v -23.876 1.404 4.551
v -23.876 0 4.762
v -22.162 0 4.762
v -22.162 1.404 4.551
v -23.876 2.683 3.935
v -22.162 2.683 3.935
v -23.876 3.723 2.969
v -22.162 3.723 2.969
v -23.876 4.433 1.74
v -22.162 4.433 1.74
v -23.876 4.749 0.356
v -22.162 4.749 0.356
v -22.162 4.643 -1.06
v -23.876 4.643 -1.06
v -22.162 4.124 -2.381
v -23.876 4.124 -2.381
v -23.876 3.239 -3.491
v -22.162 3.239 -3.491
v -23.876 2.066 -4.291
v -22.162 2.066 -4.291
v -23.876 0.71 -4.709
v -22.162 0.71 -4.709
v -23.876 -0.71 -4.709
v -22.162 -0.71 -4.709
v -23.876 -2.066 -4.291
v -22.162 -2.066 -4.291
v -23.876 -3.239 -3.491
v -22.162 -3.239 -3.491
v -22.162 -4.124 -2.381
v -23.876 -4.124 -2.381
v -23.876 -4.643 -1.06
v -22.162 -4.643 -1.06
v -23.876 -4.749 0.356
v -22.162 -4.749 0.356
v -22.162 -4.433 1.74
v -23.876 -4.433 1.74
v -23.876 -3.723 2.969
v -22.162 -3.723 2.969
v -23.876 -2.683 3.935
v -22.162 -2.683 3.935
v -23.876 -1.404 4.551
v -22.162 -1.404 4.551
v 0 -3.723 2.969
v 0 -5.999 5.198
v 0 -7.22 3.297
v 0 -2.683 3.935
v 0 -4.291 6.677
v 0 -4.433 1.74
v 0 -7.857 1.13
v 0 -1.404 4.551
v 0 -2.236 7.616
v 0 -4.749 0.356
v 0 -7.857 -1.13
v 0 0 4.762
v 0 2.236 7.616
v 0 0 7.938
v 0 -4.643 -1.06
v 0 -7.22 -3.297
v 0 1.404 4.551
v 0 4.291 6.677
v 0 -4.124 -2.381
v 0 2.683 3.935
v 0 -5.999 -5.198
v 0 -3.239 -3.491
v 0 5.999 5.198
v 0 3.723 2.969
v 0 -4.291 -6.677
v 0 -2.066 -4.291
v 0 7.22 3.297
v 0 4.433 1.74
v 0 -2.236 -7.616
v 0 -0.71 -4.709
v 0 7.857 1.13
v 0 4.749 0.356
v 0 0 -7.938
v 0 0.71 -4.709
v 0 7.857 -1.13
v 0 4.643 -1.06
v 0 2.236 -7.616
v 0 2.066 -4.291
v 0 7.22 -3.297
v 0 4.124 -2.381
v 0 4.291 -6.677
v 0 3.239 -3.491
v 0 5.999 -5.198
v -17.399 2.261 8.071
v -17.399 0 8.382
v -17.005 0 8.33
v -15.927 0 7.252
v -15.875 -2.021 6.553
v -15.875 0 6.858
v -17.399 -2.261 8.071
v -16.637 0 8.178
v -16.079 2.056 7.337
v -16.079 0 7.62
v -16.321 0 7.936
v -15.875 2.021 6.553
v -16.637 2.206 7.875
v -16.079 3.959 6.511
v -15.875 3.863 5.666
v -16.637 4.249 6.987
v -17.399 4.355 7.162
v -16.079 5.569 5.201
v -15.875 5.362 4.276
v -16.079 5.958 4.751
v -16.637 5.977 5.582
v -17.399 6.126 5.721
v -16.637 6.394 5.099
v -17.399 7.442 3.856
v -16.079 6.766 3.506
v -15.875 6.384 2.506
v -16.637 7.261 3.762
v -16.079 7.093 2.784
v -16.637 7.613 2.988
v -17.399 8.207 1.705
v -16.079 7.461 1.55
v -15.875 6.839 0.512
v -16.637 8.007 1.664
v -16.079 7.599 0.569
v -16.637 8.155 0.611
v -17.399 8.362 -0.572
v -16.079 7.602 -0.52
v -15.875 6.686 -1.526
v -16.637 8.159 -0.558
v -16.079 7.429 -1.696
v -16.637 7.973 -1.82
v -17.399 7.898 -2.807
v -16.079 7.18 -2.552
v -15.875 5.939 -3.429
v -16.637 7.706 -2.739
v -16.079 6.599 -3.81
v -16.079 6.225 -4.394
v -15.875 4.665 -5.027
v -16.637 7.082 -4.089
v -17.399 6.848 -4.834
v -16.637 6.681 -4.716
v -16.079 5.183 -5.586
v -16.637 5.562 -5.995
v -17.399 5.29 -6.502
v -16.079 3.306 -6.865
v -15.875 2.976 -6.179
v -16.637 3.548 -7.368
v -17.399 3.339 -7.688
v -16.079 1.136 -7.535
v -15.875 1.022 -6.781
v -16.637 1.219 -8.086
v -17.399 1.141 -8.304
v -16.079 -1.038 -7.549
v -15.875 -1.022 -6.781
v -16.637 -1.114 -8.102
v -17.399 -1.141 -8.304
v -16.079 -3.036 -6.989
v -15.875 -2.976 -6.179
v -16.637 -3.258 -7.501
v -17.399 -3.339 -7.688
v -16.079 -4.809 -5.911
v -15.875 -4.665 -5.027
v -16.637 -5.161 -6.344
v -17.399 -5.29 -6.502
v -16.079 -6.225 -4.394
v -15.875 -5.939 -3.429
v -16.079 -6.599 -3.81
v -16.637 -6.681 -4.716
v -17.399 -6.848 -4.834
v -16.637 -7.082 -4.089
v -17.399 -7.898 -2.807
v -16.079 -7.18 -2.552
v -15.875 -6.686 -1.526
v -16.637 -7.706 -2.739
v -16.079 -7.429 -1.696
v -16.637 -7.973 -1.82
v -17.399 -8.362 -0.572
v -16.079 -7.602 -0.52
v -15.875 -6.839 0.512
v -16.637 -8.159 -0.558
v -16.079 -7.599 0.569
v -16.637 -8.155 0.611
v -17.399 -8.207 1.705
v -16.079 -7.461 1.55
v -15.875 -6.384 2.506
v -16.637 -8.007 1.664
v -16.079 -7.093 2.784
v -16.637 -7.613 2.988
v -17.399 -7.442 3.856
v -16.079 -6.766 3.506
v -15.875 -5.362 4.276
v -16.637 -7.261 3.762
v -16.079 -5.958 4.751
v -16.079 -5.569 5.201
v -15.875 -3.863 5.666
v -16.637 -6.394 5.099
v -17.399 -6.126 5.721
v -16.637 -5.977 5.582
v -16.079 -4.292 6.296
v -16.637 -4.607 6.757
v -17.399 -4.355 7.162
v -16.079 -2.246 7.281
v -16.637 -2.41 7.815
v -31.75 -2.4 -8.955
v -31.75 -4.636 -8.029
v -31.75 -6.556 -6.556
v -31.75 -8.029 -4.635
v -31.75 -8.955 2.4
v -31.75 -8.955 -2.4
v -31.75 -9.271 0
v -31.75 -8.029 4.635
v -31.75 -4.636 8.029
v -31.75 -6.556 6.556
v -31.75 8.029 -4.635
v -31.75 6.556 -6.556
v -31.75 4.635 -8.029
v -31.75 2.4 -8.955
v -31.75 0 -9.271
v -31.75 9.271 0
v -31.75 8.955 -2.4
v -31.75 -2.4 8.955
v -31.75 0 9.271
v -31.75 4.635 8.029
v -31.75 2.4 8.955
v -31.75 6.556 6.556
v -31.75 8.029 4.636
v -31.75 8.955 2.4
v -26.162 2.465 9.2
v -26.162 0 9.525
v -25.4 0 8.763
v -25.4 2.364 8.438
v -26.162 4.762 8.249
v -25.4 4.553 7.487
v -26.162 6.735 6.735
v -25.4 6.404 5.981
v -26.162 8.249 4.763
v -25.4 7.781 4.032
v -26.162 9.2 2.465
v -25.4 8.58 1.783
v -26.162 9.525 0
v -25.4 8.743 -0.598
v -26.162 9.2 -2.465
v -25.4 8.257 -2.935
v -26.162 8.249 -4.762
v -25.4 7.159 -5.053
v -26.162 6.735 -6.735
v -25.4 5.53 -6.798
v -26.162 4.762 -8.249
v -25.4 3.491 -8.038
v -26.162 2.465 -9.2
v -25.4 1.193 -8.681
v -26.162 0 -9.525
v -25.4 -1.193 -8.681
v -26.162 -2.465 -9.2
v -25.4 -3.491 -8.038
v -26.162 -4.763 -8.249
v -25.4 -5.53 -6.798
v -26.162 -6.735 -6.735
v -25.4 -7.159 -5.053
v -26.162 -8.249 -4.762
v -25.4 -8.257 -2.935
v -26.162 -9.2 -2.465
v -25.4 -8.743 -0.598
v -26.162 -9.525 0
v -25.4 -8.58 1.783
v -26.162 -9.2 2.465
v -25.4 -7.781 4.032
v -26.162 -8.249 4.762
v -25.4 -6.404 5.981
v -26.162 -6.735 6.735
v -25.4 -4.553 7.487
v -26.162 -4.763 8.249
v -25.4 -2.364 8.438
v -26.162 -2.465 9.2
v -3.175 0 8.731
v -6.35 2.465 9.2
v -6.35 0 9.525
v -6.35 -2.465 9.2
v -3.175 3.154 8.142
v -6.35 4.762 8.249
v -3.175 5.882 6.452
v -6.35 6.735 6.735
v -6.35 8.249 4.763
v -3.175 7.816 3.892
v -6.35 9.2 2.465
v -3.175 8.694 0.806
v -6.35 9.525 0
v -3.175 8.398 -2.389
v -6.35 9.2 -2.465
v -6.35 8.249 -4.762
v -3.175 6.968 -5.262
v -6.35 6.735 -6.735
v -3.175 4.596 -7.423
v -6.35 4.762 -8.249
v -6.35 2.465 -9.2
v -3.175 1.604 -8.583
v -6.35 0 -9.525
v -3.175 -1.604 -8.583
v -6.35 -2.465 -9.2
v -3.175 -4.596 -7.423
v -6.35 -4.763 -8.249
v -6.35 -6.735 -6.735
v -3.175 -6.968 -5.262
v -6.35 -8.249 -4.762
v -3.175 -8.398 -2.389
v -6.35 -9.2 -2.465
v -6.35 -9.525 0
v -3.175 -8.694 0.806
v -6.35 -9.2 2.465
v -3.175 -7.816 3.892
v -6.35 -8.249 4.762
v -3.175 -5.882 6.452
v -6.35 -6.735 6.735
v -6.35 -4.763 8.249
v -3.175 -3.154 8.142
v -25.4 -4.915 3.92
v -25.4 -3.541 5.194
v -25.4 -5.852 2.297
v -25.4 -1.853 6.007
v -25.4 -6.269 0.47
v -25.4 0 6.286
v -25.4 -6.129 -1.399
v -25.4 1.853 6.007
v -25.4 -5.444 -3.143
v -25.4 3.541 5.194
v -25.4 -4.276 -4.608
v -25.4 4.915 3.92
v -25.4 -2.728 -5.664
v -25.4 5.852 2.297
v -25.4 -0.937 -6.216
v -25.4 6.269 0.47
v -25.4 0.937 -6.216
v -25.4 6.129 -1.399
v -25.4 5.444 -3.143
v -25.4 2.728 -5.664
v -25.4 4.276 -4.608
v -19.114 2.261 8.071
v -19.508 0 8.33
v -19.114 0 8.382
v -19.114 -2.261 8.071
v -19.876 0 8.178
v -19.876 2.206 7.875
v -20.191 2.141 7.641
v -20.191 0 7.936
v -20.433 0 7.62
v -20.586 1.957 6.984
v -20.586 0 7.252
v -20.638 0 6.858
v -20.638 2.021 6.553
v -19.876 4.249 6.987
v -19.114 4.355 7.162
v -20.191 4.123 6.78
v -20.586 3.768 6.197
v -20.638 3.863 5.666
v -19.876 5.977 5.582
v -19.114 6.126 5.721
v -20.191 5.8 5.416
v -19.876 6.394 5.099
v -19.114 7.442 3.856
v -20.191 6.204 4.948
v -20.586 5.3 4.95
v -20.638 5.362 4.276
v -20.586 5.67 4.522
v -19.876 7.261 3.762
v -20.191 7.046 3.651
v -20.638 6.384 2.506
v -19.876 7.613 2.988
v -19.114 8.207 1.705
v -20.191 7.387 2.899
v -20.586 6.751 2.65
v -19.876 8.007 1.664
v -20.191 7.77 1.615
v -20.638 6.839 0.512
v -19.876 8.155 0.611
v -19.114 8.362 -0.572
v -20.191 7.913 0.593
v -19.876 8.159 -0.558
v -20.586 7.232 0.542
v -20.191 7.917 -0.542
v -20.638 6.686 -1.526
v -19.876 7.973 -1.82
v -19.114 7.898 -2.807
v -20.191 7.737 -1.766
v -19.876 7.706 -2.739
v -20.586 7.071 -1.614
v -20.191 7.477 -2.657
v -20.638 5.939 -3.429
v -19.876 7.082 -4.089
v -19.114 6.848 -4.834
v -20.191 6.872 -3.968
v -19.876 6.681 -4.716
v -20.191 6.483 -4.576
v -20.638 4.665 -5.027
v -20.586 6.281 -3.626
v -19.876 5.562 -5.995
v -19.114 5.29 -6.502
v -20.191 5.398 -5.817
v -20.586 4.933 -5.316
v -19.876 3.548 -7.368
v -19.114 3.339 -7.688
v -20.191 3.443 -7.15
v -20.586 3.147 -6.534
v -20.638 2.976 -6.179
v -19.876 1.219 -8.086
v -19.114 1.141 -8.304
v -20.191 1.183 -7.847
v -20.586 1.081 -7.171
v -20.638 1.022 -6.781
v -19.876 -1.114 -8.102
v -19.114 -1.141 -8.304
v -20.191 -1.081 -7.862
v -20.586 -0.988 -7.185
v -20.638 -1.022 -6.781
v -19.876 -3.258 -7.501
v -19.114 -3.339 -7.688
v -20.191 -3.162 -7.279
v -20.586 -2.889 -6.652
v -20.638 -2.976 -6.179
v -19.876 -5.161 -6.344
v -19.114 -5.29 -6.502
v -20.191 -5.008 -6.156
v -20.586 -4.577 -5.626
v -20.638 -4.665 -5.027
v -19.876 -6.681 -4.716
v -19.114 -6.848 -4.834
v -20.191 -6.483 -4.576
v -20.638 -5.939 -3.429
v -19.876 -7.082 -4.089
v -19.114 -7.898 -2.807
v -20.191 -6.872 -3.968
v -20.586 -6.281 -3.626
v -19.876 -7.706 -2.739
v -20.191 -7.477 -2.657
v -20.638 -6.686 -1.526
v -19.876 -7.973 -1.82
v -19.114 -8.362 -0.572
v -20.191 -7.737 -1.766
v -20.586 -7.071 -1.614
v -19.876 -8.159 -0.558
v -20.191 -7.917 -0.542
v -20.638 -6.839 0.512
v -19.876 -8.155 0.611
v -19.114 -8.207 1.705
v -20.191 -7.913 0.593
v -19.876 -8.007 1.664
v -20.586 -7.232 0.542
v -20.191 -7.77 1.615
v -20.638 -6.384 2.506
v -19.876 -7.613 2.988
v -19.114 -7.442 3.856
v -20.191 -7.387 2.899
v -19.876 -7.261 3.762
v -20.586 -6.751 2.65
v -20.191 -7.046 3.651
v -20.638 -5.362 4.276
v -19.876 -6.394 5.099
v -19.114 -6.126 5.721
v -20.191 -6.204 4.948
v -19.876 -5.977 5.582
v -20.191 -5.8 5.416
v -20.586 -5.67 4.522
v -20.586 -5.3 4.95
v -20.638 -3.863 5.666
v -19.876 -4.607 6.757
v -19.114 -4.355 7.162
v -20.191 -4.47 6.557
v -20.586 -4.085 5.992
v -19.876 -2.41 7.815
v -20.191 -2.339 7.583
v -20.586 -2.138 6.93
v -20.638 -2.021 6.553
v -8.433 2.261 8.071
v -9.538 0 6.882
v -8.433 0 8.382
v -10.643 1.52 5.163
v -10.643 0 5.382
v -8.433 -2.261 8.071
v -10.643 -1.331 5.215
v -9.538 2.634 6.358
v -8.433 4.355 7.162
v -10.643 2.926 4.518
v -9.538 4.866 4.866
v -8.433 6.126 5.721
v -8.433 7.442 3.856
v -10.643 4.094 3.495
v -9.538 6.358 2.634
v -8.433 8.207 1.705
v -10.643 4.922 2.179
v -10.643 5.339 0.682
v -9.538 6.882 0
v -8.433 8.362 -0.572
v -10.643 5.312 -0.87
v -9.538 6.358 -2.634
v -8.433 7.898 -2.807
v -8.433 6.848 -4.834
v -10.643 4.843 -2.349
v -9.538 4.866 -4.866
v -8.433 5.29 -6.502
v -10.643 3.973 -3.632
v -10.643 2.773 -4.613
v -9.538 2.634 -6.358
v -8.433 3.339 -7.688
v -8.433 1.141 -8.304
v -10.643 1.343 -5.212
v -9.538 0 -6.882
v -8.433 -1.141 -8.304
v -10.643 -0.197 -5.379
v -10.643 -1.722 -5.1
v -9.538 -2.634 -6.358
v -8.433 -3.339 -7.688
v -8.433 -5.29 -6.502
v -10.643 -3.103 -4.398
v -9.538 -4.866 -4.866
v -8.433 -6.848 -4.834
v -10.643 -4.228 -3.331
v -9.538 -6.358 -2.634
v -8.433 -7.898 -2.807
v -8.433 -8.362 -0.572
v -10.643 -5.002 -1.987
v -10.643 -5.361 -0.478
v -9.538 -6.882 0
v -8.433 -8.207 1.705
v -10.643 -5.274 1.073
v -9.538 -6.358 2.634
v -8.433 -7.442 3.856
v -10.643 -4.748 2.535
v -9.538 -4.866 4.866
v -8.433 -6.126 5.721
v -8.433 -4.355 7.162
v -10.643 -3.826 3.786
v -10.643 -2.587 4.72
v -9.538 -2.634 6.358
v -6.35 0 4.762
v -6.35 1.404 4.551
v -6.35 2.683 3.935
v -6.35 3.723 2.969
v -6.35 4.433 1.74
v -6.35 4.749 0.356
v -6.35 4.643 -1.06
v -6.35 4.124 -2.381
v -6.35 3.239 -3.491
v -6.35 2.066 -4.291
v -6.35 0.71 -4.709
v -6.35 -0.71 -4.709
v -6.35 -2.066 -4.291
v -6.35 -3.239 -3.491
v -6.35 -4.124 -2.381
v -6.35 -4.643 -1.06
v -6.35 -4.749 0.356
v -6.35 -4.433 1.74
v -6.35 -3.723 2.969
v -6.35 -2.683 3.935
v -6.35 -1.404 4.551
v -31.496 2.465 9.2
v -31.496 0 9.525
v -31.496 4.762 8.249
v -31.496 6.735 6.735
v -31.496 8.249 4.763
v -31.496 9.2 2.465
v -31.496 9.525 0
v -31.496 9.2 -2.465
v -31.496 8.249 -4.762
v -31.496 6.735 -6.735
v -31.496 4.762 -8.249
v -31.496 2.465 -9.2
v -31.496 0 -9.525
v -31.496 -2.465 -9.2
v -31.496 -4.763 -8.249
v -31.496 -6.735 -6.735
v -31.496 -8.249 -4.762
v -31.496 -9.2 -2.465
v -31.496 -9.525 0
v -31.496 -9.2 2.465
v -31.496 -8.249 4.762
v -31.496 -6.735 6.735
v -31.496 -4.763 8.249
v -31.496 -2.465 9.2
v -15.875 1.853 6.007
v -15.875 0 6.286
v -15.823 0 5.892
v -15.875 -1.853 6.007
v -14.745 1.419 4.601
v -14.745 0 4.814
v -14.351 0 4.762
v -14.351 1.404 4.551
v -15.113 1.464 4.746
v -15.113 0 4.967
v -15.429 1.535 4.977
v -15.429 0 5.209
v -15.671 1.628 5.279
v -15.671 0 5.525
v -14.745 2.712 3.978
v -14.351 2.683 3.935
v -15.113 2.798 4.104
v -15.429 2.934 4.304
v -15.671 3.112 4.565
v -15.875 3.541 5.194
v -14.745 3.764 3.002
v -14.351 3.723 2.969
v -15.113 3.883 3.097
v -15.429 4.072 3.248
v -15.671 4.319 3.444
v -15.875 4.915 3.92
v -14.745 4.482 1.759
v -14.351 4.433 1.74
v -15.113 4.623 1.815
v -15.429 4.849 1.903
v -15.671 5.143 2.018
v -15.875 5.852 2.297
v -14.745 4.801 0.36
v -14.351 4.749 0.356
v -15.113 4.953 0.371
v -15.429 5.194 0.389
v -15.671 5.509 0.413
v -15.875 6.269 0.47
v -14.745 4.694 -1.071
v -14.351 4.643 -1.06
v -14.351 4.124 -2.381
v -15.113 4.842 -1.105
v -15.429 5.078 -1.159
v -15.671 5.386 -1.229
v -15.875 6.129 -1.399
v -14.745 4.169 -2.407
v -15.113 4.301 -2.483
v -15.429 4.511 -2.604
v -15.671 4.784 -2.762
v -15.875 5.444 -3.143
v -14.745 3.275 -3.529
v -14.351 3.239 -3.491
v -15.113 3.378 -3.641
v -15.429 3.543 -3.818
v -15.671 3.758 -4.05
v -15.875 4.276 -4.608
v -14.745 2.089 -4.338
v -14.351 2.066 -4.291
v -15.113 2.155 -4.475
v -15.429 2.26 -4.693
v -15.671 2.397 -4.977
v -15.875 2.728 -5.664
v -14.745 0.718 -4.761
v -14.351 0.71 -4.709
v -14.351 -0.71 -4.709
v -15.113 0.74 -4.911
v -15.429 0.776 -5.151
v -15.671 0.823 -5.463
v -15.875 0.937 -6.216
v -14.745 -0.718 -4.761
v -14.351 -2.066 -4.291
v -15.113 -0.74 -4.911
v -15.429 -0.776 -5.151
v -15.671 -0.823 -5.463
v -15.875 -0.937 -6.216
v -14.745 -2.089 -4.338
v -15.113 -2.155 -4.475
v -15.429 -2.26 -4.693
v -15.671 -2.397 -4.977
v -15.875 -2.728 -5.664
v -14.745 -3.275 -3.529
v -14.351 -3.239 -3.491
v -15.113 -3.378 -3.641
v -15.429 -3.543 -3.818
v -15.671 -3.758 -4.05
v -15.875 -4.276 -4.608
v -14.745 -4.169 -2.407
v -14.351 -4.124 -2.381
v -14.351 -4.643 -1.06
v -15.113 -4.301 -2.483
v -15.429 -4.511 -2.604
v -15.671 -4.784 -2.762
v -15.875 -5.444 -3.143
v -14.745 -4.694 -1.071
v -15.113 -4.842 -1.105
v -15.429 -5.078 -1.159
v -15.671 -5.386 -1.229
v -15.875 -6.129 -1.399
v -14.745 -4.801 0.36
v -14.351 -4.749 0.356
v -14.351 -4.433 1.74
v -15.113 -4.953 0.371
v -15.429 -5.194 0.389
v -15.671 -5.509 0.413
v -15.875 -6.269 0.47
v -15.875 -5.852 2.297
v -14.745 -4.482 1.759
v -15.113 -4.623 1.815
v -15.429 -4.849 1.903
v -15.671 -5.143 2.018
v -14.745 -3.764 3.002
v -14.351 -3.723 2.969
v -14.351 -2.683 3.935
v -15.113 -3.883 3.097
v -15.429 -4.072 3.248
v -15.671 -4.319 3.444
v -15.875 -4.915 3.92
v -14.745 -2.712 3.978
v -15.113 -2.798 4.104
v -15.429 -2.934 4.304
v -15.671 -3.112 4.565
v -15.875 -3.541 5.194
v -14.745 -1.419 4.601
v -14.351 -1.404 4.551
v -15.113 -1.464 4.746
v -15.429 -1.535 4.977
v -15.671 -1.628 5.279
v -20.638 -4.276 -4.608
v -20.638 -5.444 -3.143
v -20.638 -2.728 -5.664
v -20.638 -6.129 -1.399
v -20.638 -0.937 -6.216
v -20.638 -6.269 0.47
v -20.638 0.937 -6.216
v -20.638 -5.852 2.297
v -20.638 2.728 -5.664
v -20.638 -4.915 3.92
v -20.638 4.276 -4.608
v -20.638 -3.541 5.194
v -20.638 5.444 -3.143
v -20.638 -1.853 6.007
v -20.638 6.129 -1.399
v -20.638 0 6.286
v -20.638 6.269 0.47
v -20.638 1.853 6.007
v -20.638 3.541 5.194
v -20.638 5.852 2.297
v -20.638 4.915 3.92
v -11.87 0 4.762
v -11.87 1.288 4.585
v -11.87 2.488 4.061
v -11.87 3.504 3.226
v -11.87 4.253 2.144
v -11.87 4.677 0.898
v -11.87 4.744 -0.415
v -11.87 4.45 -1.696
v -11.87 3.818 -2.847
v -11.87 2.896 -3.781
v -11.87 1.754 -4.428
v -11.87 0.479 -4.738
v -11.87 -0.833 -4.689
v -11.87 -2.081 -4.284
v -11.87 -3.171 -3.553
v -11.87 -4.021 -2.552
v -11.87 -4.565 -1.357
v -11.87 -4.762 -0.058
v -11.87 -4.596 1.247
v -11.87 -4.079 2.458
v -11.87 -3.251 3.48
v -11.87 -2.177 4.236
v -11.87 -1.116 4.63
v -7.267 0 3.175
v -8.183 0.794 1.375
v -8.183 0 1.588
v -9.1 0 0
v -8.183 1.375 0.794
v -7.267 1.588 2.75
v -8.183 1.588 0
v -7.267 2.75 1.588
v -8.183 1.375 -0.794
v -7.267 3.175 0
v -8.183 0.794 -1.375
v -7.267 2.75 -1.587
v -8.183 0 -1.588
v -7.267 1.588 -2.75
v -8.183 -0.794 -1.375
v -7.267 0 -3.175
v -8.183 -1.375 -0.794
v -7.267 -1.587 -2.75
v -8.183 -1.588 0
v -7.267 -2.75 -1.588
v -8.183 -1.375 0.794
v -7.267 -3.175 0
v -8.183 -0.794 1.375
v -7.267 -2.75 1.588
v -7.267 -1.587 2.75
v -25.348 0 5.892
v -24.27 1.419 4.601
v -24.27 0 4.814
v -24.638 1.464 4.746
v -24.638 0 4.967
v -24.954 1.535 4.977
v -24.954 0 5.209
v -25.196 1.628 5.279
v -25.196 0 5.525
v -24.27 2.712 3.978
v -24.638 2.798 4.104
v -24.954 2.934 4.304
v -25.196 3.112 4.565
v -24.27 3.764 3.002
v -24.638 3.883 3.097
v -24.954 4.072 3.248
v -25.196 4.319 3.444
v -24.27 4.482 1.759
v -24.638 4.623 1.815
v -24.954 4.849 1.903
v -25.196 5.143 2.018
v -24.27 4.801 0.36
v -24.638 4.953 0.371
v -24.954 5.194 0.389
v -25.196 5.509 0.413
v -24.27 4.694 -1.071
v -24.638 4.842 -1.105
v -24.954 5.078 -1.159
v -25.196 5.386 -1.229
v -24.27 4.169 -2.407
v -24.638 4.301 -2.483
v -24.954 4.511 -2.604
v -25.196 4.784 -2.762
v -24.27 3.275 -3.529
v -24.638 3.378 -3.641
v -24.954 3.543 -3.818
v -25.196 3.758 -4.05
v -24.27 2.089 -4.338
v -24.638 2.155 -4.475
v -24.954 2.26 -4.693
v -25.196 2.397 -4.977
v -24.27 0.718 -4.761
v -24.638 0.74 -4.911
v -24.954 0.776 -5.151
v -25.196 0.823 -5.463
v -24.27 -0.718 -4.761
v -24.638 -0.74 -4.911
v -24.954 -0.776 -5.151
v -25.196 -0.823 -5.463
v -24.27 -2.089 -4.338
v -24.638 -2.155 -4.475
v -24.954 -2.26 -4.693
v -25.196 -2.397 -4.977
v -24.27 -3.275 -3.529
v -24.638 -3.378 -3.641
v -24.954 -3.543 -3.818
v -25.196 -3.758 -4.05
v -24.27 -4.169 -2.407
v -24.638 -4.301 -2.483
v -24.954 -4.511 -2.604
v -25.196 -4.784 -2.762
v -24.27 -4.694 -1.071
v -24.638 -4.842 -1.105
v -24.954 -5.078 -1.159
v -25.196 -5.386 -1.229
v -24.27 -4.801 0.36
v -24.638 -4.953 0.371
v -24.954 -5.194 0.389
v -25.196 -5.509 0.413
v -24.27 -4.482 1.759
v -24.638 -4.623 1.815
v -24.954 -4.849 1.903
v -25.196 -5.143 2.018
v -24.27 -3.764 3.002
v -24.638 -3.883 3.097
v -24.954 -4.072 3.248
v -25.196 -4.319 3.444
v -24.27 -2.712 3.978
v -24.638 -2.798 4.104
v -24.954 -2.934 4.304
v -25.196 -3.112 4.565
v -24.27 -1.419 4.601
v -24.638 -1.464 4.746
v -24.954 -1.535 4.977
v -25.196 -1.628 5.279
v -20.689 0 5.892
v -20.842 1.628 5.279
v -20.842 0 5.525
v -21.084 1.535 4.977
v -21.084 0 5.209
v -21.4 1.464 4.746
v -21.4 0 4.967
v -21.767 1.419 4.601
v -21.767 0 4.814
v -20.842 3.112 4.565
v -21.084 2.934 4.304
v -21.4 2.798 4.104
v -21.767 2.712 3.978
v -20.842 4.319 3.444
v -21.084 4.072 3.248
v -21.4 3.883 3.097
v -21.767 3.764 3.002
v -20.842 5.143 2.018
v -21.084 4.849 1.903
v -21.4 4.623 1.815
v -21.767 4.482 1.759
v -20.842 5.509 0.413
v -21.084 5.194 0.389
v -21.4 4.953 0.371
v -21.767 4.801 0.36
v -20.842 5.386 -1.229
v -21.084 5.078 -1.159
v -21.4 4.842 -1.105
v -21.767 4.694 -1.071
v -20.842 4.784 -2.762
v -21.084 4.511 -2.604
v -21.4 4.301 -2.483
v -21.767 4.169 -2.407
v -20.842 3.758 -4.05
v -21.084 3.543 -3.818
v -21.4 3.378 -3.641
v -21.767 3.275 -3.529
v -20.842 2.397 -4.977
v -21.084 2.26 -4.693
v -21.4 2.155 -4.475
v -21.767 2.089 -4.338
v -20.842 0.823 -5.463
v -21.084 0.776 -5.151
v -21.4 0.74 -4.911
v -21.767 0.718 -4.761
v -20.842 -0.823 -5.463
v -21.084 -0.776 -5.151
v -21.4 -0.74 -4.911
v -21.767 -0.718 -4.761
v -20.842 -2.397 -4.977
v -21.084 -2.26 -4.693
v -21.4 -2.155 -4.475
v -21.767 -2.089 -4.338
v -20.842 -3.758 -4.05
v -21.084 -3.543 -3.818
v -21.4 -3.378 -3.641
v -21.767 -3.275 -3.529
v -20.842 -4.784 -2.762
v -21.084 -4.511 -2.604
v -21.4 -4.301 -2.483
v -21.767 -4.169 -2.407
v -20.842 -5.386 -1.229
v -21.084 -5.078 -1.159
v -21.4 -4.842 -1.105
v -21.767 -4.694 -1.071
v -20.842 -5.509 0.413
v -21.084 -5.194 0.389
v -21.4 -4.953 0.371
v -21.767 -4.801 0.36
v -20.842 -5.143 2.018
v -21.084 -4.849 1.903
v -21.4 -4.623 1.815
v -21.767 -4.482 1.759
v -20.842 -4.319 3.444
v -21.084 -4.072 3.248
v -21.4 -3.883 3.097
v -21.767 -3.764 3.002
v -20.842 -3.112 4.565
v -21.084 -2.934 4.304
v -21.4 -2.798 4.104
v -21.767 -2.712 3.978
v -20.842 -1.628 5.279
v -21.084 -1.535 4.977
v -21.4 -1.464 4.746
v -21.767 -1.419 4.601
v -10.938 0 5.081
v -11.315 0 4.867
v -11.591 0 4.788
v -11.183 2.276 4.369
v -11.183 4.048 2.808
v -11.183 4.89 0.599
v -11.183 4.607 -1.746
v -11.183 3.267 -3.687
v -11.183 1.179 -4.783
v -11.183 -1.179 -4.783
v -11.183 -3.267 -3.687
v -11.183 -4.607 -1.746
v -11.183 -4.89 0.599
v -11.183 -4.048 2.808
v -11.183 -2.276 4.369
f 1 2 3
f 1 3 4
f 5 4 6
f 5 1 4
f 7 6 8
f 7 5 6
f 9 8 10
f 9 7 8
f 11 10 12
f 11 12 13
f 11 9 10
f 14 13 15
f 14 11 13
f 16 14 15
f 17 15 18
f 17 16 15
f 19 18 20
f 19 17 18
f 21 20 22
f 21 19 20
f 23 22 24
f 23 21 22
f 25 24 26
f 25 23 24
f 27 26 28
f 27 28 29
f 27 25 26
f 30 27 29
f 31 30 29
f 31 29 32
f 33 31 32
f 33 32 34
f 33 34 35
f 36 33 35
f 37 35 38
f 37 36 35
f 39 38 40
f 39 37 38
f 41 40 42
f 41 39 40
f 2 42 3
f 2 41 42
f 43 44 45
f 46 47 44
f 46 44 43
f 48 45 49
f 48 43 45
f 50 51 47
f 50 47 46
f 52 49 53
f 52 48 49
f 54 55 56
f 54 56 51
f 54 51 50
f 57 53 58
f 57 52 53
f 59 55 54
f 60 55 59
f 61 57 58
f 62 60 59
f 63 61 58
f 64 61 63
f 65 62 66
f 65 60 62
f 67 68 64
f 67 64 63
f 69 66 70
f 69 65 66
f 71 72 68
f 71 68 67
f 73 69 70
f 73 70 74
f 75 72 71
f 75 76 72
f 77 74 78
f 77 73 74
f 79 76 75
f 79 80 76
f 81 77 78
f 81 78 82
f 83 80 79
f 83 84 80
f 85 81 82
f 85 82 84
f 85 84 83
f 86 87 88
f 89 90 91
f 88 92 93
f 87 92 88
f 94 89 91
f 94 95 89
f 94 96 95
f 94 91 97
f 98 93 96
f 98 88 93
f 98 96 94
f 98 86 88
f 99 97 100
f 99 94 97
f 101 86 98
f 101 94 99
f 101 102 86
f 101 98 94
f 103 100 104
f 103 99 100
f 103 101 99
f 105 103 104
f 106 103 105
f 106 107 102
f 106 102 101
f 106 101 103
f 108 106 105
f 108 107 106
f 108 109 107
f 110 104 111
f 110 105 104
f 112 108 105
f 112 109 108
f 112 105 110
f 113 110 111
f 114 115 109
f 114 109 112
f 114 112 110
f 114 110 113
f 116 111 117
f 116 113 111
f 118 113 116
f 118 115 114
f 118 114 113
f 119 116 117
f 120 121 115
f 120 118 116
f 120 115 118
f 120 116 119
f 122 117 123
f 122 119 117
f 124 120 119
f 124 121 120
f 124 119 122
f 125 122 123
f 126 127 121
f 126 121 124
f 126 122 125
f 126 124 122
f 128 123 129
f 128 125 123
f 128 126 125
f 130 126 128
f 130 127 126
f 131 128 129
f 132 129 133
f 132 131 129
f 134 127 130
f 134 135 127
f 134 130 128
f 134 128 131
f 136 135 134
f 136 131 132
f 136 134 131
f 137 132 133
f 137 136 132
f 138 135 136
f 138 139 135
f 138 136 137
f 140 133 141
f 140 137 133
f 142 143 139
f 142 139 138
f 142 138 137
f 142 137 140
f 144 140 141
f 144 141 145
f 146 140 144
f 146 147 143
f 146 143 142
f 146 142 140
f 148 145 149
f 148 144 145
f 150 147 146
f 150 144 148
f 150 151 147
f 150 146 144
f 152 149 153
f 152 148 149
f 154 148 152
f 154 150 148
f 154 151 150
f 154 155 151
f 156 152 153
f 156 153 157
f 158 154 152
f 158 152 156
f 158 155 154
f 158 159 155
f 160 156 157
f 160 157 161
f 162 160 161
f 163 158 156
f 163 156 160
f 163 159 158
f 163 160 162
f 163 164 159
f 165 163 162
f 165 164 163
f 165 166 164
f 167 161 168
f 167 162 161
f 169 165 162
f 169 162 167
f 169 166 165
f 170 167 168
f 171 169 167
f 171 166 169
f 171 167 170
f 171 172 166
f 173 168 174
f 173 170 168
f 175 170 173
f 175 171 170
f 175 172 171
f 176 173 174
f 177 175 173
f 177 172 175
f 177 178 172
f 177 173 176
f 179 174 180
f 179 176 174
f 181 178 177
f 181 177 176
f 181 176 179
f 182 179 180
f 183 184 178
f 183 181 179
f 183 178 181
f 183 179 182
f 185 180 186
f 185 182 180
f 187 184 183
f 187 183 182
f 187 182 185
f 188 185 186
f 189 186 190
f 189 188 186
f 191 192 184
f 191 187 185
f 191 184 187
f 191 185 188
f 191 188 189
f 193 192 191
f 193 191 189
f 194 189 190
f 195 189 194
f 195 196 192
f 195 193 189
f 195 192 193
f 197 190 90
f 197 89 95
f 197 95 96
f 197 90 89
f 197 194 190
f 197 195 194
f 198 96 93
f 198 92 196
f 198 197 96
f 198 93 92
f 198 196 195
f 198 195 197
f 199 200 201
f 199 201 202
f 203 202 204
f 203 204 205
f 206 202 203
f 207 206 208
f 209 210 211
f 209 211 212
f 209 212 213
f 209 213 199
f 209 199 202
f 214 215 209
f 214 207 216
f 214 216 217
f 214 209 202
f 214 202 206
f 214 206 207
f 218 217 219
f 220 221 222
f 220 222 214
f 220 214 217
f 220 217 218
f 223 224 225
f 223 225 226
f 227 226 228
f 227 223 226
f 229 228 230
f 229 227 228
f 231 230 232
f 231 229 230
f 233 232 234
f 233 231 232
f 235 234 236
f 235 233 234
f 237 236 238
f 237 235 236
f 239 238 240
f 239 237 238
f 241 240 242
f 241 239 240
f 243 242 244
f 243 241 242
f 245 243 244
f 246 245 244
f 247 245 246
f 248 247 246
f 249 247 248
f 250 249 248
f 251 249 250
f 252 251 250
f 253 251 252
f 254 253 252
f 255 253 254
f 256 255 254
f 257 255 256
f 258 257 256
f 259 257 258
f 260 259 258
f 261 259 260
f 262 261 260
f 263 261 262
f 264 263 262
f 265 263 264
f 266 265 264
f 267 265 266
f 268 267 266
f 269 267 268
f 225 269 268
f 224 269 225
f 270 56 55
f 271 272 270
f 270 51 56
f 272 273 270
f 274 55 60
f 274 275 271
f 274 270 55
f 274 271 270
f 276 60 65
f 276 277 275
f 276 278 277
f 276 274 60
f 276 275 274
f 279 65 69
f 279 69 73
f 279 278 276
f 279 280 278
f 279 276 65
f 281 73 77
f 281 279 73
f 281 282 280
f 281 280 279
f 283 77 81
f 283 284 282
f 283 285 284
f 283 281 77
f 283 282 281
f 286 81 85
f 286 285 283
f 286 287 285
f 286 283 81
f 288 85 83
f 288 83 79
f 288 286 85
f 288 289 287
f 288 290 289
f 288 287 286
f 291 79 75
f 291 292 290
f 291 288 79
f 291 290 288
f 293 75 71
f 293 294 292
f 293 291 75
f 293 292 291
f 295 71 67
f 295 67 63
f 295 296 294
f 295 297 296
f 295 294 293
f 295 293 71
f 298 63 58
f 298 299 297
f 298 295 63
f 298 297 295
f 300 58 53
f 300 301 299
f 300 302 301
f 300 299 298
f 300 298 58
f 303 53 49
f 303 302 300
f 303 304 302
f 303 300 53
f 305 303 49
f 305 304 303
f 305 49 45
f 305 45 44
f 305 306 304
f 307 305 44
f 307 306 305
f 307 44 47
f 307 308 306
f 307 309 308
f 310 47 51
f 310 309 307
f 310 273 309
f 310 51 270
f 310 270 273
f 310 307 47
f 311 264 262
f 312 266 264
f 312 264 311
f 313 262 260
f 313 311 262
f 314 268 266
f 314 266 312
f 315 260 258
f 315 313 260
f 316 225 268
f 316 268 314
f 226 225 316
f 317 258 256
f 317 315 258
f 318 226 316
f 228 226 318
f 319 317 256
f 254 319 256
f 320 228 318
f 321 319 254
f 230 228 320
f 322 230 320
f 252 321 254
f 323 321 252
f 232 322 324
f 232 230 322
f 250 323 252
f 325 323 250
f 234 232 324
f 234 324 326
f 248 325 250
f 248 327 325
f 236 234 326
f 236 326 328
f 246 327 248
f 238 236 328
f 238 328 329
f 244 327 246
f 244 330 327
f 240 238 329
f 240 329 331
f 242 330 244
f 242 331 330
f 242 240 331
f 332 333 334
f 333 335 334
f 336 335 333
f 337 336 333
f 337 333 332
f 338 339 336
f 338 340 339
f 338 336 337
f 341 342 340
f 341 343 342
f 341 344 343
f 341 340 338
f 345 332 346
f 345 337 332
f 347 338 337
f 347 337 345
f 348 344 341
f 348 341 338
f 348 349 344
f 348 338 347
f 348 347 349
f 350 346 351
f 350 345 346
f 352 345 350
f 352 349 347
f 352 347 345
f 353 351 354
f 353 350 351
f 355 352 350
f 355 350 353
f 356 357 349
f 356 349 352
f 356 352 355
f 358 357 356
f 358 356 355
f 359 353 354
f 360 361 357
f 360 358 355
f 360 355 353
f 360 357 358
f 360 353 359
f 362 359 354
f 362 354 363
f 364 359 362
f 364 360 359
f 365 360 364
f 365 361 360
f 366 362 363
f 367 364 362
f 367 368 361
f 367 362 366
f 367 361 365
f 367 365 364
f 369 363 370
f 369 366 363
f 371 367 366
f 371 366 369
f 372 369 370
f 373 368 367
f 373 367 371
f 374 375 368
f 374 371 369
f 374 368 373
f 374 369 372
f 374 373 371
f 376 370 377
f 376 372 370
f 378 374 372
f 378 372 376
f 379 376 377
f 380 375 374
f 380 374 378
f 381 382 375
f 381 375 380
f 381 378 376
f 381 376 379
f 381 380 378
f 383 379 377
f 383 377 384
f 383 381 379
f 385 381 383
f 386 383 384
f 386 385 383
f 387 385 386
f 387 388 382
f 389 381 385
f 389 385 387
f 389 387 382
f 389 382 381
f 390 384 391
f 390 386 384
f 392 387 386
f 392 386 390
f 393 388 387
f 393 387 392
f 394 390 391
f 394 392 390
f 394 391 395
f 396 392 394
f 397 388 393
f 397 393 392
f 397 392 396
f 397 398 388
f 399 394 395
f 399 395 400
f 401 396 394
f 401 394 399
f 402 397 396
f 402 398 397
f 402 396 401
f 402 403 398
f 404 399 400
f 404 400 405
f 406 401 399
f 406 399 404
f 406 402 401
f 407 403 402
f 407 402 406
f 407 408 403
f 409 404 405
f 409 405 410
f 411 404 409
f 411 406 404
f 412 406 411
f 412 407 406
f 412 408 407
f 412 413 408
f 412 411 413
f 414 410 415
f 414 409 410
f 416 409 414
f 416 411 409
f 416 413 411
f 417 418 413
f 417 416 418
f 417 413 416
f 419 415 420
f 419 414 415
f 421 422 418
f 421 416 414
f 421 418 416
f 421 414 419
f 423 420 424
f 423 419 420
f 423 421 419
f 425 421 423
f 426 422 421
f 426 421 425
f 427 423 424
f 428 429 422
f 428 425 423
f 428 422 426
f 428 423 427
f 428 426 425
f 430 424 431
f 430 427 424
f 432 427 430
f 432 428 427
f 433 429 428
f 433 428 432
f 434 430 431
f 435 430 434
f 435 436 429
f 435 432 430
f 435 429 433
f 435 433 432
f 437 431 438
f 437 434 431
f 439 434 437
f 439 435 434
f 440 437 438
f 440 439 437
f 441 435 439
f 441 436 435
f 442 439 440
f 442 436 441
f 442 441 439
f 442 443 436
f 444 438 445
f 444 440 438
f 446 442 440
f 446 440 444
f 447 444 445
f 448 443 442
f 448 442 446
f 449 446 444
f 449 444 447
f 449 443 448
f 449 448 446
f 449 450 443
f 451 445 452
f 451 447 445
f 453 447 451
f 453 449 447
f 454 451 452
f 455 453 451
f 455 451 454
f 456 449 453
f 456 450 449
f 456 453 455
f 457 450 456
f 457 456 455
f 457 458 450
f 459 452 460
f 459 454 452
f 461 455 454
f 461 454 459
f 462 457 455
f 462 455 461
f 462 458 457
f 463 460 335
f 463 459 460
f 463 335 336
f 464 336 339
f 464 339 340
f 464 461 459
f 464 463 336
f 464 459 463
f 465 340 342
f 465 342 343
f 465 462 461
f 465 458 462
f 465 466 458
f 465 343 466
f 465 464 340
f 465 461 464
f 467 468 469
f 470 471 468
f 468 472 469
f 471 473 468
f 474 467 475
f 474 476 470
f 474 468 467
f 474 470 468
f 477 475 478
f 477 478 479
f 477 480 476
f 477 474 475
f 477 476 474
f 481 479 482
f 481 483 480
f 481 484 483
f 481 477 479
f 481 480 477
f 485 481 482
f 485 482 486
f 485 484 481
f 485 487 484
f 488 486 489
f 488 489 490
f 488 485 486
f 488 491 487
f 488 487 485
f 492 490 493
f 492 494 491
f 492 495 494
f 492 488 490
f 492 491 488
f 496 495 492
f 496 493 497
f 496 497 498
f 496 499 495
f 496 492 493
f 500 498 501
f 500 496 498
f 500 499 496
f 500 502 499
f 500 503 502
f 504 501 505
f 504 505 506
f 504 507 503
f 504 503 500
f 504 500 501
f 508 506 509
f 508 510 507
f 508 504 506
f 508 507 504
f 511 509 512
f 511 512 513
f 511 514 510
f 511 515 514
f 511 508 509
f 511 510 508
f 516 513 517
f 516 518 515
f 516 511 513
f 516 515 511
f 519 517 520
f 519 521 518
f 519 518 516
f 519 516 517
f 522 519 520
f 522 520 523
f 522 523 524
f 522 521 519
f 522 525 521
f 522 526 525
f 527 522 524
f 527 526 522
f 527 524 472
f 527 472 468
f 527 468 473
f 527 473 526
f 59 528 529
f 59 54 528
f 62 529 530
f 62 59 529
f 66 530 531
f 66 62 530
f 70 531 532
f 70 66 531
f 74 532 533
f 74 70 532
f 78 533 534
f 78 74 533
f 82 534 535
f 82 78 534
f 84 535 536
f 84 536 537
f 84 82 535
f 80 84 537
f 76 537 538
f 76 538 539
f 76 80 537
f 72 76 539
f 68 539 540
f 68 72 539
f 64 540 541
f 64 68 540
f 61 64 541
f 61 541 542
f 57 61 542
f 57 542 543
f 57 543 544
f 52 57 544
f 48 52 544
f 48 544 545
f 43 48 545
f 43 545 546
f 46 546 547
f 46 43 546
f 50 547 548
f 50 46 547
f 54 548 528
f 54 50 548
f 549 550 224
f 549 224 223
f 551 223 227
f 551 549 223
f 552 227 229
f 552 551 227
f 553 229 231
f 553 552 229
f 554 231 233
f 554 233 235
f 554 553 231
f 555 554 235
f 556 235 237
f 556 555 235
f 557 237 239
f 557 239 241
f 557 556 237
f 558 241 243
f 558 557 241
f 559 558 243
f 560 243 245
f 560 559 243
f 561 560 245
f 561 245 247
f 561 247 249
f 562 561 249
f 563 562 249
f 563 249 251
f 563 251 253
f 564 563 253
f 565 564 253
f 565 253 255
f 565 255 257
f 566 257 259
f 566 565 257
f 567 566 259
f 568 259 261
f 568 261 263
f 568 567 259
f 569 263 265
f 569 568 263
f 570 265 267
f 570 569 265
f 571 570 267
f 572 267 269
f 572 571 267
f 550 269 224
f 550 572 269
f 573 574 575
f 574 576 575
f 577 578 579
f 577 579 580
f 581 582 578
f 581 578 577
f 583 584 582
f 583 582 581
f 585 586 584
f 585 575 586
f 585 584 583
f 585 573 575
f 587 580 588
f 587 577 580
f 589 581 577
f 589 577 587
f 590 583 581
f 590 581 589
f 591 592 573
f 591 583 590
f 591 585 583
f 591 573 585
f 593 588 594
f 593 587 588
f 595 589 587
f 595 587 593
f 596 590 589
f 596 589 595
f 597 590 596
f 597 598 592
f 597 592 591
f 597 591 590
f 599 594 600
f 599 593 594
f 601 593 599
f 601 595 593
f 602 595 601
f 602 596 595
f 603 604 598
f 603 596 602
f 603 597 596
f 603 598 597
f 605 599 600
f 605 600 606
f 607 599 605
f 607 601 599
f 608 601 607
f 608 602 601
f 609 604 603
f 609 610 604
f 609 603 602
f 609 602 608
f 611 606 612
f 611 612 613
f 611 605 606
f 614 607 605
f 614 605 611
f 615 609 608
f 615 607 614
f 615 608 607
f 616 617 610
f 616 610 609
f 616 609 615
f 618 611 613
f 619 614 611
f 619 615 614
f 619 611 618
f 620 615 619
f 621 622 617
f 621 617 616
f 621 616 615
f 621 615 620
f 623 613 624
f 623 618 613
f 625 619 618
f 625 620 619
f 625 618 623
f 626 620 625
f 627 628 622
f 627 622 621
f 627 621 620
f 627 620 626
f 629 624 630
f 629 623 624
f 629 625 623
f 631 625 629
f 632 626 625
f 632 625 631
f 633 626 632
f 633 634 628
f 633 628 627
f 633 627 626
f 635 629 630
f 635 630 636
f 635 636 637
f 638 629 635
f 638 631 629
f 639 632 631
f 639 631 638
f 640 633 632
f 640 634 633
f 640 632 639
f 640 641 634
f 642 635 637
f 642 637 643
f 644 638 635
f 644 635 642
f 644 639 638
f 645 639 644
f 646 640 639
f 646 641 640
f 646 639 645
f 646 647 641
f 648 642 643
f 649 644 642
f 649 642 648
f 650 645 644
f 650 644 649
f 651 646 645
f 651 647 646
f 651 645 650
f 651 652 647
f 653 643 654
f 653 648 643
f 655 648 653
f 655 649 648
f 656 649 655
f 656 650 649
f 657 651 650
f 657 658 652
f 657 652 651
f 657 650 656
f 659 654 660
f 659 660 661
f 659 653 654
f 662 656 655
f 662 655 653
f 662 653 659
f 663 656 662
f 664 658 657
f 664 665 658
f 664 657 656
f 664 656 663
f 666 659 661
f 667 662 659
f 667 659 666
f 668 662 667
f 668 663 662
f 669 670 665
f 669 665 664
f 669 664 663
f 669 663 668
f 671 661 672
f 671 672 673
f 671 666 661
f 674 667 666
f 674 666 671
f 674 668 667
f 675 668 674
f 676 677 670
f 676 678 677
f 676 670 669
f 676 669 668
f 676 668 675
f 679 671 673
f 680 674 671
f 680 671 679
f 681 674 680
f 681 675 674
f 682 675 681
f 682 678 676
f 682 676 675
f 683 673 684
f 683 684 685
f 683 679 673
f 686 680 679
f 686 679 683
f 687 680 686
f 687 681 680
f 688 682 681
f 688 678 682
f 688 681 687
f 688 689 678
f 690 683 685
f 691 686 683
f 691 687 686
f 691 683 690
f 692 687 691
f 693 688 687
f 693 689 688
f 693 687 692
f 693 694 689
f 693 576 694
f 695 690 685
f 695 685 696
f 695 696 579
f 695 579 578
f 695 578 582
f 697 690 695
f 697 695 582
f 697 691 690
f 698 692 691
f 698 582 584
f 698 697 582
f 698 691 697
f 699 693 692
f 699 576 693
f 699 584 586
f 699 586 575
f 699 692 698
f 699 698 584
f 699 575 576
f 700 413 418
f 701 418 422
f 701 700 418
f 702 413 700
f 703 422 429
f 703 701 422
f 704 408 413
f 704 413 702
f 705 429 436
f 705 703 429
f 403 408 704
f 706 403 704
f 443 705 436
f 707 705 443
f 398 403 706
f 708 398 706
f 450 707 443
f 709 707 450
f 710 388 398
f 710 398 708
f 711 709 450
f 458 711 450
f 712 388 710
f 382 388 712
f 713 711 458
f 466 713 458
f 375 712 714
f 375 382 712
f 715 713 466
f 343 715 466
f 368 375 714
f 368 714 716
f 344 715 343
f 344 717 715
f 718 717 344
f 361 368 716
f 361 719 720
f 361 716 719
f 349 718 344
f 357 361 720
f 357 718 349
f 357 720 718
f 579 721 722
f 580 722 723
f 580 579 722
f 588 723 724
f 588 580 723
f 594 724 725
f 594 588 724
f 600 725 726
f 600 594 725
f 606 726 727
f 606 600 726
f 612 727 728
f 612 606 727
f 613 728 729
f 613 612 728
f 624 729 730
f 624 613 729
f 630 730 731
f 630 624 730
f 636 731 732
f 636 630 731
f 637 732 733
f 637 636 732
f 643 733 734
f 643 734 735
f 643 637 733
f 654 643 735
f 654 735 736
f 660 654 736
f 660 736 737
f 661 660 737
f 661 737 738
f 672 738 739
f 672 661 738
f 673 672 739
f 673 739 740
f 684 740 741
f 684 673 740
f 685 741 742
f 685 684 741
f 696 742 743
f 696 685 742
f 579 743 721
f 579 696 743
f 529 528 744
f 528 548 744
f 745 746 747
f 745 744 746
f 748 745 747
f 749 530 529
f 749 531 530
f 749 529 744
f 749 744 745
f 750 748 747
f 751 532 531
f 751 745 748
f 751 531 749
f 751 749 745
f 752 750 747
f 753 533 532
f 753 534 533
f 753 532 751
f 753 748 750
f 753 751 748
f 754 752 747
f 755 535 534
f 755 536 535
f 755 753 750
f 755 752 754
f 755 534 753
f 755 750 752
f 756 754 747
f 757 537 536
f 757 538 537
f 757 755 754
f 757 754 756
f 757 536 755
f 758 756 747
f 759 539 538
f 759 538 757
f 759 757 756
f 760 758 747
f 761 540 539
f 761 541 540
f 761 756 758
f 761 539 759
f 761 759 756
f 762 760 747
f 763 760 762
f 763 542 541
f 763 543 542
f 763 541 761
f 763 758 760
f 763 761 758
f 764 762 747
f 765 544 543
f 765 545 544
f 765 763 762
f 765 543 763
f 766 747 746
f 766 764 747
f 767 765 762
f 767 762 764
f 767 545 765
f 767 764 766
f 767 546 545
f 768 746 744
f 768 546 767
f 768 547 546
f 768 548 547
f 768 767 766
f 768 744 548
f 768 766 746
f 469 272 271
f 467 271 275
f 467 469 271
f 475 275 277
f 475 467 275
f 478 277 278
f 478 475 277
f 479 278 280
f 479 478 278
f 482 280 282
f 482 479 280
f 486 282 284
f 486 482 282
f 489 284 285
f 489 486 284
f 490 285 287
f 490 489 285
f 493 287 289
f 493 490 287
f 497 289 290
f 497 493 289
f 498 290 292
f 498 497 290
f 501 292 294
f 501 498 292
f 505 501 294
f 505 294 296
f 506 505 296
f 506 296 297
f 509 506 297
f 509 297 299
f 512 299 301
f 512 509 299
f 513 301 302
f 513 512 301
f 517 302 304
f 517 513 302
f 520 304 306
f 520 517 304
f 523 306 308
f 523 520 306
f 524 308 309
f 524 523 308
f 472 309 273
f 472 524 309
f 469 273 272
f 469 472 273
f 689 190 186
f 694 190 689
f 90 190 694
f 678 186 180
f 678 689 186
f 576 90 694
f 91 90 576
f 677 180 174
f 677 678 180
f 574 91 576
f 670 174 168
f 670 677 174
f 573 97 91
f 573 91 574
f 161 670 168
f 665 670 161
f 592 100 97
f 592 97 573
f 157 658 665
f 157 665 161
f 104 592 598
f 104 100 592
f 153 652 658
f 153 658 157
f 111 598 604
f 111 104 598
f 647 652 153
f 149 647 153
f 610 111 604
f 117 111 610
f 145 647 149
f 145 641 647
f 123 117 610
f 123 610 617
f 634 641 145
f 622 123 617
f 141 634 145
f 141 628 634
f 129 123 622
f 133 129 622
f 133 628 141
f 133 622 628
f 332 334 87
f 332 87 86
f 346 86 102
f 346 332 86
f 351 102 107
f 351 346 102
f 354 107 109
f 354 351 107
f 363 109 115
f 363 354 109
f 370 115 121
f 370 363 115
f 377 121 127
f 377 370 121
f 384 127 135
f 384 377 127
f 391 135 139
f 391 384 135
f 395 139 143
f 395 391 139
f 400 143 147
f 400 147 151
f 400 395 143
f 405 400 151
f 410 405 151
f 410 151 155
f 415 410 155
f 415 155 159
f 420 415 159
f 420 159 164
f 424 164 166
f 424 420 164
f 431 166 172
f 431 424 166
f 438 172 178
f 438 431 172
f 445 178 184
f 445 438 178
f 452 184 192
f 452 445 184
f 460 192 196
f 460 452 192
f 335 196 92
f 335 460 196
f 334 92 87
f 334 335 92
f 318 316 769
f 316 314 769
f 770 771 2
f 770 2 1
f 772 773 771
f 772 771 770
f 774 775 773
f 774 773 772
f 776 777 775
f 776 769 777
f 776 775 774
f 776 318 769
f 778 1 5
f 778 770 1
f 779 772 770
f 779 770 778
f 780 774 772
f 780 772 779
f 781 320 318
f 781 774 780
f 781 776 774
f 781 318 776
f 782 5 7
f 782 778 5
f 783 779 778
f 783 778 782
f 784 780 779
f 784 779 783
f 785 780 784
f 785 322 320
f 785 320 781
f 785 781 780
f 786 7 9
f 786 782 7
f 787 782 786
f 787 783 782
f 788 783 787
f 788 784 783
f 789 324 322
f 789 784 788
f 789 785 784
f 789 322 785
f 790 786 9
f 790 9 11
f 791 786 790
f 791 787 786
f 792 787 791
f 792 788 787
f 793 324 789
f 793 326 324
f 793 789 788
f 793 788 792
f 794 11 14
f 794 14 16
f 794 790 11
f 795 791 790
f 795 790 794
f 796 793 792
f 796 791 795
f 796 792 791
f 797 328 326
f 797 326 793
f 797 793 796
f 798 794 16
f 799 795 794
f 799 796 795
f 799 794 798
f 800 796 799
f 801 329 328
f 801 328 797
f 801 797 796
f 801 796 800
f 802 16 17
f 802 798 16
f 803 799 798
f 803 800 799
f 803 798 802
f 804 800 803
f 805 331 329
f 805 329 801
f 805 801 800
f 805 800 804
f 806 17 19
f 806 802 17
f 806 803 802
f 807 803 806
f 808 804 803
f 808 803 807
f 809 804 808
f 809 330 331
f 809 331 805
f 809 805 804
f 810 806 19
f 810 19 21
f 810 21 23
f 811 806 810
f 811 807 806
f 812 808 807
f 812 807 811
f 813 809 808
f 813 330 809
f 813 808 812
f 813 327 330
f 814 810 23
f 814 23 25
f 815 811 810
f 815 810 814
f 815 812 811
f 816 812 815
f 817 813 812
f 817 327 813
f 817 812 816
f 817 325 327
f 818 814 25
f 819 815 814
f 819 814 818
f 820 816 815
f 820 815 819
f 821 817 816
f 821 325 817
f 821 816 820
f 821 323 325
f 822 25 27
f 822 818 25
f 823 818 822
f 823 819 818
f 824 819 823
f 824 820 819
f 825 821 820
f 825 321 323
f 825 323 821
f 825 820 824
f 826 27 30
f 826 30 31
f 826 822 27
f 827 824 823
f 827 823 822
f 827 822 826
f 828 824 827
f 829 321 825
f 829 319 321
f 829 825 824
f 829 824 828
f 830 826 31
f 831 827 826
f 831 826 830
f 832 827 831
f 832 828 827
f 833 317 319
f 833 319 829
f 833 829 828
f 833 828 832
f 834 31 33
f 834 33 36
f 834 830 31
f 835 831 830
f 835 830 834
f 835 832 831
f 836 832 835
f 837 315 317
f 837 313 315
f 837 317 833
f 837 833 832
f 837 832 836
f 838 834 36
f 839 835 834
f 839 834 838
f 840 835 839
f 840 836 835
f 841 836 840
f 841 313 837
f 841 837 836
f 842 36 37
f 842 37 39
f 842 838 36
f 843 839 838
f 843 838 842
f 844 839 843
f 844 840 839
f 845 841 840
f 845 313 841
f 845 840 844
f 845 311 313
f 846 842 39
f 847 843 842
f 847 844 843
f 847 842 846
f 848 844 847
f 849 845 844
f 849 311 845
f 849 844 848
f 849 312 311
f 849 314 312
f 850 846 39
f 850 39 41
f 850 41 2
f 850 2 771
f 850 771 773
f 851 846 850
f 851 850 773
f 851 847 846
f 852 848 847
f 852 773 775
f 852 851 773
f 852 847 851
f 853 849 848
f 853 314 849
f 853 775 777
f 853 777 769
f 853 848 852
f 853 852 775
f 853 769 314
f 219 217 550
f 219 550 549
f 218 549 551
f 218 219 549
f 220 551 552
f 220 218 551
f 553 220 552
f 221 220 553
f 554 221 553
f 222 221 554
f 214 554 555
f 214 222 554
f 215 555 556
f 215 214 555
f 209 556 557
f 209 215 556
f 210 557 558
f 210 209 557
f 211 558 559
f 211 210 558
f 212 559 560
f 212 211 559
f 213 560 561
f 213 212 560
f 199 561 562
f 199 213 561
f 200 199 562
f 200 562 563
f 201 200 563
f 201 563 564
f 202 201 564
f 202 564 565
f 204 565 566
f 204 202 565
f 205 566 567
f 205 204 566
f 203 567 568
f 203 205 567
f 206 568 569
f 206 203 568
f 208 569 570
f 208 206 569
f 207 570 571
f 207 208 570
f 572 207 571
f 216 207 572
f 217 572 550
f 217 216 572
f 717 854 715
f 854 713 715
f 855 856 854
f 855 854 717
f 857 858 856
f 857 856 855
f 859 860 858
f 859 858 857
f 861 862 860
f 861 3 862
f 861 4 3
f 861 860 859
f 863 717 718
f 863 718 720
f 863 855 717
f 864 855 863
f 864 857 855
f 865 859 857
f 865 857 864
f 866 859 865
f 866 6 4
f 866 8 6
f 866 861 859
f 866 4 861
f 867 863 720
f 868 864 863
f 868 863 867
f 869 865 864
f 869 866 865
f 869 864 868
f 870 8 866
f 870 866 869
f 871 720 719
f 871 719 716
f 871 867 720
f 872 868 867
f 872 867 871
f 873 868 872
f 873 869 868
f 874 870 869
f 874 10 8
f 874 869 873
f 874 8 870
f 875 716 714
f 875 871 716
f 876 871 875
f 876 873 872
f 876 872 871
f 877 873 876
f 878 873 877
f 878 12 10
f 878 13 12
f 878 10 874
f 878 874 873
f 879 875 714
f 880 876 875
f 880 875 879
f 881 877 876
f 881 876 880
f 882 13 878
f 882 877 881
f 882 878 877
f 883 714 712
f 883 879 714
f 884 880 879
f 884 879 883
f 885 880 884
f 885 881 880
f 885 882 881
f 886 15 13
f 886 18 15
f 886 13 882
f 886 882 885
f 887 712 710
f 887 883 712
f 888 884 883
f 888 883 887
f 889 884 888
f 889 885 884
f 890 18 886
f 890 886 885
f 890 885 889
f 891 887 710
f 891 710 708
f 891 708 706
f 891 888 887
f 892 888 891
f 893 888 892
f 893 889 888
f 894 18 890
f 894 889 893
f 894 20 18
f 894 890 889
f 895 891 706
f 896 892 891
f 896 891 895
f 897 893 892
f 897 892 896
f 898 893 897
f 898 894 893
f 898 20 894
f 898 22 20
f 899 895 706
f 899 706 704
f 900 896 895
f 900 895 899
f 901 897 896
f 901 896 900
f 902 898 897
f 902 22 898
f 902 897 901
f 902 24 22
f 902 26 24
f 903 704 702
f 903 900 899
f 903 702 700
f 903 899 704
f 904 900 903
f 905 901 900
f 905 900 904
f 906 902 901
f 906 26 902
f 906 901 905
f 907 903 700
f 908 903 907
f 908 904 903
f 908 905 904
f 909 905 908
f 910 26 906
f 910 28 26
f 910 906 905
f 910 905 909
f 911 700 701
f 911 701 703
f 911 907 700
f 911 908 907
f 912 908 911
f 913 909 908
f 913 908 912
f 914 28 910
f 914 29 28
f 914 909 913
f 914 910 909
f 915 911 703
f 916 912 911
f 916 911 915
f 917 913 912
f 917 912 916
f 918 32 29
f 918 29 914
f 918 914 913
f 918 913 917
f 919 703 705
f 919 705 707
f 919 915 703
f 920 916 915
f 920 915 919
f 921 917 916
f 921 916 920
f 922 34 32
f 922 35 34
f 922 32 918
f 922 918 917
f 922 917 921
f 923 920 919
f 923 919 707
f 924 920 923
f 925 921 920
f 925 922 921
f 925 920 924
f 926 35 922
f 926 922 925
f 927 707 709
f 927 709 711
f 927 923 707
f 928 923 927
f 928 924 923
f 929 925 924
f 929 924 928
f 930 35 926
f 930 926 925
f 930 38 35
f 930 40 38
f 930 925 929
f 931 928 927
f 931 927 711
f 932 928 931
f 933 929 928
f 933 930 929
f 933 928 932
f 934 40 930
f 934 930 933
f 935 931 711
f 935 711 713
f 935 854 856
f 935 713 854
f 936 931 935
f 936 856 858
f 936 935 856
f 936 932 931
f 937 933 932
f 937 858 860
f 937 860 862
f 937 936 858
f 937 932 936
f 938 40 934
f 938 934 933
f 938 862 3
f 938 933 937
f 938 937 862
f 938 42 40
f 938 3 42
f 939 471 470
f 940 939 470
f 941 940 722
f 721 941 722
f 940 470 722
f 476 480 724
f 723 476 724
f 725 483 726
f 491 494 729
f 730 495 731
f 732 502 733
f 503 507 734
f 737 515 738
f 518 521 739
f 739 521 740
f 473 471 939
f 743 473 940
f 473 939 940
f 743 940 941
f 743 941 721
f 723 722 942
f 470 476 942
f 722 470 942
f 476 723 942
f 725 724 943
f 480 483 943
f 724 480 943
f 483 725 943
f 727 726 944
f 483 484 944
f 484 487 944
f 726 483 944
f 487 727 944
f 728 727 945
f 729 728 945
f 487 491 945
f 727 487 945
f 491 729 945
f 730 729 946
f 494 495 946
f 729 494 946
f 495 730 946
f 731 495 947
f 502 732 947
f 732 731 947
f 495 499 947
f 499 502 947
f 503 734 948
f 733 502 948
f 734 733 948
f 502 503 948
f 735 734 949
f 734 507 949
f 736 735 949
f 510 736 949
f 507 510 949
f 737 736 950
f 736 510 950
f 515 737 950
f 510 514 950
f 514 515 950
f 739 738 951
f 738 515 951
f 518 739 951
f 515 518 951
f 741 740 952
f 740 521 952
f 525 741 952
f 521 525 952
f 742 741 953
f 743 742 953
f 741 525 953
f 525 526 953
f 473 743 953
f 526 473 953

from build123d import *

# Parameters (mm, degrees)
F2_R    = 1.524
F3_SIZE = 0.762
F4_SIZE = 0.254


with BuildPart() as f1:
    # F0 (on Front) → F1 (revolve)
    with BuildSketch(Plane.XZ):
        Polygon((-31.75, 0), (-9.099631, 0), (-6.35, 4.7625), (0, 4.7625), (0, 7.9375), (-6.35, 9.525), (-8.432799, 8.382), (-11.0998, 4.7625), (-15.875, 4.7625), (-15.875, 8.382), (-20.6375, 8.382), (-20.6375, 4.7625), (-25.4, 4.7625), (-25.4, 9.525), (-31.75, 9.525), align=None)
    revolve(axis=Axis((-15.875, 0, 0), (-1, 0, 0)))

    # F2
    f2_edges = [f1.edges().sort_by_distance(p)[0] for p in [
        (-20.6375, 0, -8.382),
        (-15.875, 0, -4.7625),
        (-15.875, 0, -8.382),
        (-20.6375, 0, -4.7625),
        (-11.0998, 0, -4.7625),
        (-25.4, 0, -4.7625),
    ]]
    fillet(f2_edges, radius=F2_R)

    # F3
    f3_edges = [f1.edges().sort_by_distance(p)[0] for p in [
        (-25.4, 0, -9.525),
    ]]
    chamfer(f3_edges, length=F3_SIZE)

    # F4
    f4_edges = [f1.edges().sort_by_distance(p)[0] for p in [
        (-31.75, 0, -9.525),
    ]]
    chamfer(f4_edges, length=F4_SIZE)


solid = f1.part
